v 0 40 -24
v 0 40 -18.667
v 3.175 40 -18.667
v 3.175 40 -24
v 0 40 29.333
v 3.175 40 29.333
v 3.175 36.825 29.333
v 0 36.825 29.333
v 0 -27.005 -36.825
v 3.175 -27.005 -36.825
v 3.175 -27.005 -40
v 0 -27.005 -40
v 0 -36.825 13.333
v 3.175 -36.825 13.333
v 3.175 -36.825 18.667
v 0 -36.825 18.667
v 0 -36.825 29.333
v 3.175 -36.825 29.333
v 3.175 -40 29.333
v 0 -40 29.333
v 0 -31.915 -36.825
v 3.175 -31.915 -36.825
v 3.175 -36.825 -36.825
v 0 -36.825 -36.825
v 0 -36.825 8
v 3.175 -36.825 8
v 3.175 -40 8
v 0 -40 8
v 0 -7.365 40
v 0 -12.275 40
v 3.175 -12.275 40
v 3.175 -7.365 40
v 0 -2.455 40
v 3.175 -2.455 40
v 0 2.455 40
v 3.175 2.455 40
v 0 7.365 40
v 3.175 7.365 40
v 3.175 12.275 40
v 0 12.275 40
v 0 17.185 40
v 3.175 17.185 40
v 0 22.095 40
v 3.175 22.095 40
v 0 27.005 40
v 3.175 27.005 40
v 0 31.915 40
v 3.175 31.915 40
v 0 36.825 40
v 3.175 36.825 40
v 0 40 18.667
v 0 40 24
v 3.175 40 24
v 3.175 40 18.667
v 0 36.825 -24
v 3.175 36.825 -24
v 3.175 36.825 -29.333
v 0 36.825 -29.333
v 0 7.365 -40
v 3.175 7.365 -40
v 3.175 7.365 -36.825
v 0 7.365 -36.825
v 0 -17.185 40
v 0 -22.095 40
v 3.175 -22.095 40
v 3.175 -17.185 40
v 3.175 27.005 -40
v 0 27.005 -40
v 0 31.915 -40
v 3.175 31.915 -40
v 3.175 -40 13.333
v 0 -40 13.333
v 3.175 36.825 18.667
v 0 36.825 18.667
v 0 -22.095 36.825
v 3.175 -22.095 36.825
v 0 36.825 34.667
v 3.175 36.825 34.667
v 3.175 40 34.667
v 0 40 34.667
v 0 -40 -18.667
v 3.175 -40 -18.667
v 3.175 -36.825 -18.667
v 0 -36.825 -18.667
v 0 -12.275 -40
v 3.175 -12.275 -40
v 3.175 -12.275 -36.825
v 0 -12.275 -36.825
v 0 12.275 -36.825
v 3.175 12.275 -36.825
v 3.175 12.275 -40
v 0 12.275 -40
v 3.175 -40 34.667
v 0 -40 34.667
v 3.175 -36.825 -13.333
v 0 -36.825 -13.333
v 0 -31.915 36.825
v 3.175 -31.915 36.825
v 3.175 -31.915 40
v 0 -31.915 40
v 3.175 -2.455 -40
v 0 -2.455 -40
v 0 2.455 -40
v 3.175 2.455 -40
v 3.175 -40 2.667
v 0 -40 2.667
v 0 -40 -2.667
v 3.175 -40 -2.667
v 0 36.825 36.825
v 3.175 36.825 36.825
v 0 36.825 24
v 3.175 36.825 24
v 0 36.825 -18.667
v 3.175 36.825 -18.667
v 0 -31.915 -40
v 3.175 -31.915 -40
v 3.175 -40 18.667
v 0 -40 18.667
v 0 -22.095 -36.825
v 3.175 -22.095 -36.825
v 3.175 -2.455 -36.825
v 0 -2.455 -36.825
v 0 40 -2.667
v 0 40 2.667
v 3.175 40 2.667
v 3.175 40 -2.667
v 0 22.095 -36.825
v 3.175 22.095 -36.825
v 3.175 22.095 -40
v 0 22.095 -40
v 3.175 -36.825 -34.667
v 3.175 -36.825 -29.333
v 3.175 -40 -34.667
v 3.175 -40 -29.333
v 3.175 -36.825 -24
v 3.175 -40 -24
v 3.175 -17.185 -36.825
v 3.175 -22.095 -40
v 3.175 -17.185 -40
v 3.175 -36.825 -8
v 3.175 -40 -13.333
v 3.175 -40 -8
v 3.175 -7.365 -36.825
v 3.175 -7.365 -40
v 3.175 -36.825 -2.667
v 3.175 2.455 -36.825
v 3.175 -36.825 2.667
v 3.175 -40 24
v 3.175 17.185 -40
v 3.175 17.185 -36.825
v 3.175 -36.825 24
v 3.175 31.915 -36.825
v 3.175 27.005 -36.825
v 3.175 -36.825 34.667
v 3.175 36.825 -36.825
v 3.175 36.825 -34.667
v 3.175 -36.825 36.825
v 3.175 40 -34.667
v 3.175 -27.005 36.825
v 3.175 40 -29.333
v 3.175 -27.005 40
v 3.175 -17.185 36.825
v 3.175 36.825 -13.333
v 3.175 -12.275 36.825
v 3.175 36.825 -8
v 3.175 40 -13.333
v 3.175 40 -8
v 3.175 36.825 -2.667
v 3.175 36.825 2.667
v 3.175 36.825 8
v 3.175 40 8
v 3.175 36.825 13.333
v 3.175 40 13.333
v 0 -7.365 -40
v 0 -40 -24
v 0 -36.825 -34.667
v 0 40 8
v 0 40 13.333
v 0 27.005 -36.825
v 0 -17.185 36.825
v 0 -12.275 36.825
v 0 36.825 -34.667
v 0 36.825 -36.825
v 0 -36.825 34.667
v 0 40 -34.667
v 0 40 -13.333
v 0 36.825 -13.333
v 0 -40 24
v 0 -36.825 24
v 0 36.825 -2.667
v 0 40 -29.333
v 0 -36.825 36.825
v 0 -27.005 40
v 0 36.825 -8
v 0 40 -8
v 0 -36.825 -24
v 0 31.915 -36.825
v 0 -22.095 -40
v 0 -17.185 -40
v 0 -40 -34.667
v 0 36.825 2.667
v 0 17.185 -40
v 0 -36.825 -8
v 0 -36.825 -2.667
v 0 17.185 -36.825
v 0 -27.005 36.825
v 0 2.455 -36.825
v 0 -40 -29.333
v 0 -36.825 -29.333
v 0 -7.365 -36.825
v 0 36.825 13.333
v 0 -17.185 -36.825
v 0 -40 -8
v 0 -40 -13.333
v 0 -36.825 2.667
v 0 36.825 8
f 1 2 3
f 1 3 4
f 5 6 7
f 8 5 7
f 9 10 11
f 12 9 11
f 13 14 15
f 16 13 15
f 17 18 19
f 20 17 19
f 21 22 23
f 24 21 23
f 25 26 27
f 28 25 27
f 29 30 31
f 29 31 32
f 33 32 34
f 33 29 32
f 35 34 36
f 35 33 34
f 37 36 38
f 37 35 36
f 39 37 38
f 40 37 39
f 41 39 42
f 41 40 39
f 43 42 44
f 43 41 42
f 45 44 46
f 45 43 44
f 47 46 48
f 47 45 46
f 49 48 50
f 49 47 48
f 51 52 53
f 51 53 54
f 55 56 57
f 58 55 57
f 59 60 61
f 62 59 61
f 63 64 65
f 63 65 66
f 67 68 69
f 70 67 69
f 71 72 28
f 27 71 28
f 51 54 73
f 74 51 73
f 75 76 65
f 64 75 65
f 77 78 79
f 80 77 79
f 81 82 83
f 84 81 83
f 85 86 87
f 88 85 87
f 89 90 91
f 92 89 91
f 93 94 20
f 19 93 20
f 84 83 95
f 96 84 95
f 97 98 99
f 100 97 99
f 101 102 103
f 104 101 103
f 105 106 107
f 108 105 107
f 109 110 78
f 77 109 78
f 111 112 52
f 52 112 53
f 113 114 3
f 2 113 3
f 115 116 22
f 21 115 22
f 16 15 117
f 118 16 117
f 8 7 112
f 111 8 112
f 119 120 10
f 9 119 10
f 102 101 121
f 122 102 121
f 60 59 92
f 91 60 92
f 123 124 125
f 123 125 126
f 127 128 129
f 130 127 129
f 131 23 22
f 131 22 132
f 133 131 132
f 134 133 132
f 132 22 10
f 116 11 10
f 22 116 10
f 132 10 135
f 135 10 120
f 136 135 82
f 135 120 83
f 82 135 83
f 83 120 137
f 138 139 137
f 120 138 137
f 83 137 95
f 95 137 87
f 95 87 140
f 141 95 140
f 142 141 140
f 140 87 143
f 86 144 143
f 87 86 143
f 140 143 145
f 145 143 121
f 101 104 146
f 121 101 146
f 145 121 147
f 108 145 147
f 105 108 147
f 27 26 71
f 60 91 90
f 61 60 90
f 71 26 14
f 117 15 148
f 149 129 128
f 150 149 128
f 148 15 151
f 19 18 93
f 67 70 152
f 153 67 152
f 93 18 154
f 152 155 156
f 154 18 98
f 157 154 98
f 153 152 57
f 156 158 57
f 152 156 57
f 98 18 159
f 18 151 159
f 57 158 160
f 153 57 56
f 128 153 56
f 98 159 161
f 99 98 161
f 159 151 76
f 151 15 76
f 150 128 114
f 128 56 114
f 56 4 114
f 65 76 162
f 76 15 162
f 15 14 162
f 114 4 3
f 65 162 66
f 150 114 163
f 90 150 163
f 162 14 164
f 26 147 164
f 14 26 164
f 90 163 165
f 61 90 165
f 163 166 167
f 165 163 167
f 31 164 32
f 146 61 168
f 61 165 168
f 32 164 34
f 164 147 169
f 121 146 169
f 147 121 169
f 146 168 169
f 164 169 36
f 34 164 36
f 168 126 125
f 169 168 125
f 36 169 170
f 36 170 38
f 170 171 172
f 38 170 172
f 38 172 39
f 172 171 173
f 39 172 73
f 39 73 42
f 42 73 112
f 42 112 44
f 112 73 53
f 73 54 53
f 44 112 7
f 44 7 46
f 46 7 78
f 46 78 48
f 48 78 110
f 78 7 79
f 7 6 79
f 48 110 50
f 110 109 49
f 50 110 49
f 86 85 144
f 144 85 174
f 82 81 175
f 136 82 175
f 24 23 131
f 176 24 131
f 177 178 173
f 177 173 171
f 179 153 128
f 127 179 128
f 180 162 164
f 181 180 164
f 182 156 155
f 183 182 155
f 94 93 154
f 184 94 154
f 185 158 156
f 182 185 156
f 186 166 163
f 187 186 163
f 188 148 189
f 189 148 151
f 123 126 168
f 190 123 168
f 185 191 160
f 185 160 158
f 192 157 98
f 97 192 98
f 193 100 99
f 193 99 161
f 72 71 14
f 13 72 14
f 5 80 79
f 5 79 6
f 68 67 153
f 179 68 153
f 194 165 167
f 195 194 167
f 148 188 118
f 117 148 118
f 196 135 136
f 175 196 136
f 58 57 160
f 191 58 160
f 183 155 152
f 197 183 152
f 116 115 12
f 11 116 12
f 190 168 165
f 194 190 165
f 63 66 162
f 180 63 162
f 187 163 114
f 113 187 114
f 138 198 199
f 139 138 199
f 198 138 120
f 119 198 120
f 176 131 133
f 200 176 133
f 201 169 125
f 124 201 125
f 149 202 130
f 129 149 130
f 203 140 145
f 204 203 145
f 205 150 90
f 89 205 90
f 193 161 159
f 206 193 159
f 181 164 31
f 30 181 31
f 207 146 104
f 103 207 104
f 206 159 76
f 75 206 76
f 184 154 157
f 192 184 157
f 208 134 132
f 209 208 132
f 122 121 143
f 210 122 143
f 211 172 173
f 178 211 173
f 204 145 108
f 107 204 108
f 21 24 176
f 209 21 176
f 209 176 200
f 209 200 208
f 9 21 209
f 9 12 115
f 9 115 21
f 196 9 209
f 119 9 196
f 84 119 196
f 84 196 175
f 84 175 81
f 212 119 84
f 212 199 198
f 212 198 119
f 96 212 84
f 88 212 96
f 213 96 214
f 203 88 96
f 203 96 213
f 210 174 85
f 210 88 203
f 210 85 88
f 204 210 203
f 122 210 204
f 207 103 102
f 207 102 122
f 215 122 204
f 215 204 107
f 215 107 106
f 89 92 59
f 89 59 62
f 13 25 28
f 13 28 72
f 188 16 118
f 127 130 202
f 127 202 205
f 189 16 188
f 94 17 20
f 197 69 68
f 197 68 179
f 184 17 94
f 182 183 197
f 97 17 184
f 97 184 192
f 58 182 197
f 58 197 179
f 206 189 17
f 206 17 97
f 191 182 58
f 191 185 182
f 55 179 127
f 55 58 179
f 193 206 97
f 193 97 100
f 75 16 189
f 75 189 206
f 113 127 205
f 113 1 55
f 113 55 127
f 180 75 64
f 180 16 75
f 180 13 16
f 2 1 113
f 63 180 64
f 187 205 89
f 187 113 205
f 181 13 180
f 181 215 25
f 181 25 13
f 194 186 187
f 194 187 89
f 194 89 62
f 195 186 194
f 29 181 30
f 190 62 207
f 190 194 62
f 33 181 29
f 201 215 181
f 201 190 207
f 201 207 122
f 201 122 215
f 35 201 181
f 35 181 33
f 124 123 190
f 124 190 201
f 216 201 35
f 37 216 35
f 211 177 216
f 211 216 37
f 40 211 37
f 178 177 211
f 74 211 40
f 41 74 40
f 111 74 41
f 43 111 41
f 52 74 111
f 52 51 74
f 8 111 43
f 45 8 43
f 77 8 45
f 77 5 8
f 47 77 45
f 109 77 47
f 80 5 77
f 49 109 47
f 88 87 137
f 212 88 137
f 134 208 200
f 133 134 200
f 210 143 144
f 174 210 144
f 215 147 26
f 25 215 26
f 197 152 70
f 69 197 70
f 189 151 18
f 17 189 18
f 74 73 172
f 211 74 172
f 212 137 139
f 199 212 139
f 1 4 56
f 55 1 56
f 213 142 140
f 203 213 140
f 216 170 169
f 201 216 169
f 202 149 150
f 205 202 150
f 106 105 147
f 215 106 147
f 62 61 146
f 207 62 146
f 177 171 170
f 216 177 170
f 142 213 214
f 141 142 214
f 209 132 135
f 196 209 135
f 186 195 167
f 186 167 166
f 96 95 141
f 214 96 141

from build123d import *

# Parameters (mm, degrees)
SKETCH2_W           = 80
SKETCH2_H           = 80
BOSS_EXTRUDE1_DEPTH = 3.175
SKETCH3_OUTSIDE_W   = 104.636
SKETCH3_OUTSIDE_H   = 104.636
CUT_EXTRUDE1_DEPTH  = 57.657573413
SKETCH5_W           = 3.175000001
SKETCH5_H           = 44.189999998
BOSS_EXTRUDE3_DEPTH = 3.175


with BuildPart() as part:
    # Sketch2 → Boss-Extrude1 (new body)
    with BuildSketch(Plane(origin=(0, 0, 0), x_dir=(0, 0, -1), z_dir=(1, 0, 0))):
        Rectangle(SKETCH2_W, SKETCH2_H)
    extrude(amount=BOSS_EXTRUDE1_DEPTH)

    # Sketch3 outside → Cut-Extrude1 (cut, through all)
    with BuildSketch(Plane(origin=(3.175, 0, 0), x_dir=(0, 0, -1), z_dir=(1, 0, 0))):
        Rectangle(SKETCH3_OUTSIDE_W, SKETCH3_OUTSIDE_H)
        Polygon((-36.824999999, 36.825), (-34.666666667, 36.824999997), (-34.666666667, 39.999999997), (-29.333333333, 39.999999997), (-29.333333333, 36.824999997), (-24, 36.824999997), (-24, 40), (-18.666666667, 40), (-18.666666667, 36.825), (-13.333333333, 36.825), (-13.333333333, 40), (-8, 40), (-8, 36.825), (-2.666666667, 36.825), (-2.666666667, 40), (2.666666667, 40), (2.666666667, 36.825), (8, 36.825), (8, 40), (13.333333333, 40), (13.333333333, 36.825), (18.666666667, 36.825), (18.666666667, 40), (24, 40), (24, 36.825), (29.333333333, 36.825), (29.333333333, 40), (34.666666667, 40), (34.666666667, 36.825), (36.824999999, 36.825), (36.824999999, 31.915), (40, 31.915000001), (40, 27.005), (36.824999999, 27.005), (36.824999999, 22.095000001), (40, 22.095000001), (40, 17.185000001), (36.824999999, 17.185000001), (36.824999999, 12.275000001), (40, 12.275000001), (40, 7.365000001), (36.824999999, 7.365000001), (36.824999999, 2.455000001), (40, 2.455000002), (40, -2.454999999), (36.824999999, -2.454999999), (36.824999999, -7.364999998), (40, -7.364999998), (40, -12.274999998), (36.824999999, -12.274999998), (36.824999999, -17.184999998), (40, -17.184999998), (40, -22.094999998), (36.824999999, -22.094999998), (36.824999999, -27.004999998), (40, -27.004999997), (40, -31.914999997), (36.824999999, -31.914999997), (36.824999999, -36.824999997), (34.666666667, -36.825), (34.666666667, -40), (29.333333333, -40), (29.333333333, -36.825), (24, -36.825), (24, -40), (18.666666667, -40), (18.666666667, -36.825), (13.333333333, -36.825), (13.333333333, -40), (8, -40), (8, -36.825), (2.666666667, -36.825), (2.666666667, -40), (-2.666666667, -40), (-2.666666667, -36.825), (-8, -36.825), (-8, -40), (-13.333333333, -40), (-13.333333333, -36.825), (-18.666666667, -36.825), (-18.666666667, -40), (-24, -40), (-24, -36.824999997), (-29.333333333, -36.824999997), (-29.333333333, -39.999999997), (-34.666666667, -39.999999997), (-34.666666667, -36.824999997), (-36.825, -36.824999997), (-36.825, -31.914999997), (-40.000000001, -31.914999997), (-40.000000001, -27.004999997), (-36.825, -27.004999997), (-36.825, -22.094999998), (-40.000000001, -22.094999997), (-40.000000001, -17.184999998), (-36.825, -17.184999998), (-36.825, -12.274999998), (-40.000000001, -12.274999998), (-40, -7.364999998), (-36.825, -7.364999998), (-36.825, -2.454999999), (-40, -2.454999998), (-40, 2.455000002), (-36.825, 2.455000002), (-36.825, 7.365000001), (-40, 7.365000002), (-40, 12.275000001), (-36.825, 12.275000001), (-36.824999999, 17.185000001), (-40, 17.185000002), (-40, 22.095000001), (-36.824999999, 22.095000001), (-36.824999999, 27.005000001), (-40, 27.005000001), (-40, 31.915000001), (-36.824999999, 31.915000001), align=None, mode=Mode.SUBTRACT)
    extrude(amount=-CUT_EXTRUDE1_DEPTH, mode=Mode.SUBTRACT)

    # Sketch5 → Boss-Extrude3 (add)
    with BuildSketch(Plane.ZY):
        with Locations((38.412499999, 14.730000001)):
            Rectangle(SKETCH5_W, SKETCH5_H)
    extrude(amount=-BOSS_EXTRUDE3_DEPTH)


solid = part.part
